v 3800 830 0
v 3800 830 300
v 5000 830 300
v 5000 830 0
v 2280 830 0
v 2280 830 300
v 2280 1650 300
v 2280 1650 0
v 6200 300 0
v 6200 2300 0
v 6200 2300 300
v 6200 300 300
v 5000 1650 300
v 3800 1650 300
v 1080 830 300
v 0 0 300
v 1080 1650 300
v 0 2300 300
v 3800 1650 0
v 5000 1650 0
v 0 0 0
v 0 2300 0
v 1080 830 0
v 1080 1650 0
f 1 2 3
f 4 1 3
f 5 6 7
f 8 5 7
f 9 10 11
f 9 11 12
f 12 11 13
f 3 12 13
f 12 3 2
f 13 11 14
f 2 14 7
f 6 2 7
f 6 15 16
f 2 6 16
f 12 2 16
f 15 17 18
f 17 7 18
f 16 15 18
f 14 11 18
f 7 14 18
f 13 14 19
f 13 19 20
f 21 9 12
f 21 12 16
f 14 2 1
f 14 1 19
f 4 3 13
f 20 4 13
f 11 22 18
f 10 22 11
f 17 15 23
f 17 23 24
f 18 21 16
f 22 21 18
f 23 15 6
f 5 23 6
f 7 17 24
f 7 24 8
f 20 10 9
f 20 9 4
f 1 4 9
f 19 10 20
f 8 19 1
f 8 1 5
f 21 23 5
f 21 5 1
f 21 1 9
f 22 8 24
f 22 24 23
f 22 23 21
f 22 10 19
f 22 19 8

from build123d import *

# Parameters (mm, degrees)
BOSS_EXTRU_1_DEPTH      = 300
ESQUISSE2_W             = 1200
ESQUISSE2_H             = 820
ENL_V_MAT_EXTRU_1_DEPTH = 6620.667665374


with BuildPart() as part:
    # Esquisse1 → Boss.-Extru.1 (new body)
    with BuildSketch(Plane.XY):
        Polygon((0, 0), (0, 2300), (6200, 2300), (6200, 300), align=None)
    extrude(amount=BOSS_EXTRU_1_DEPTH)

    # Esquisse2 → Enlèv. mat.-Extru.1 (cut, through all)
    with BuildSketch(Plane.XY.offset(300)):
        with Locations((1680, 1240)):
            Rectangle(ESQUISSE2_W, ESQUISSE2_H)
        with Locations((4400, 1240)):
            Rectangle(ESQUISSE2_W, ESQUISSE2_H)
    extrude(amount=-ENL_V_MAT_EXTRU_1_DEPTH, mode=Mode.SUBTRACT)


solid = part.part
